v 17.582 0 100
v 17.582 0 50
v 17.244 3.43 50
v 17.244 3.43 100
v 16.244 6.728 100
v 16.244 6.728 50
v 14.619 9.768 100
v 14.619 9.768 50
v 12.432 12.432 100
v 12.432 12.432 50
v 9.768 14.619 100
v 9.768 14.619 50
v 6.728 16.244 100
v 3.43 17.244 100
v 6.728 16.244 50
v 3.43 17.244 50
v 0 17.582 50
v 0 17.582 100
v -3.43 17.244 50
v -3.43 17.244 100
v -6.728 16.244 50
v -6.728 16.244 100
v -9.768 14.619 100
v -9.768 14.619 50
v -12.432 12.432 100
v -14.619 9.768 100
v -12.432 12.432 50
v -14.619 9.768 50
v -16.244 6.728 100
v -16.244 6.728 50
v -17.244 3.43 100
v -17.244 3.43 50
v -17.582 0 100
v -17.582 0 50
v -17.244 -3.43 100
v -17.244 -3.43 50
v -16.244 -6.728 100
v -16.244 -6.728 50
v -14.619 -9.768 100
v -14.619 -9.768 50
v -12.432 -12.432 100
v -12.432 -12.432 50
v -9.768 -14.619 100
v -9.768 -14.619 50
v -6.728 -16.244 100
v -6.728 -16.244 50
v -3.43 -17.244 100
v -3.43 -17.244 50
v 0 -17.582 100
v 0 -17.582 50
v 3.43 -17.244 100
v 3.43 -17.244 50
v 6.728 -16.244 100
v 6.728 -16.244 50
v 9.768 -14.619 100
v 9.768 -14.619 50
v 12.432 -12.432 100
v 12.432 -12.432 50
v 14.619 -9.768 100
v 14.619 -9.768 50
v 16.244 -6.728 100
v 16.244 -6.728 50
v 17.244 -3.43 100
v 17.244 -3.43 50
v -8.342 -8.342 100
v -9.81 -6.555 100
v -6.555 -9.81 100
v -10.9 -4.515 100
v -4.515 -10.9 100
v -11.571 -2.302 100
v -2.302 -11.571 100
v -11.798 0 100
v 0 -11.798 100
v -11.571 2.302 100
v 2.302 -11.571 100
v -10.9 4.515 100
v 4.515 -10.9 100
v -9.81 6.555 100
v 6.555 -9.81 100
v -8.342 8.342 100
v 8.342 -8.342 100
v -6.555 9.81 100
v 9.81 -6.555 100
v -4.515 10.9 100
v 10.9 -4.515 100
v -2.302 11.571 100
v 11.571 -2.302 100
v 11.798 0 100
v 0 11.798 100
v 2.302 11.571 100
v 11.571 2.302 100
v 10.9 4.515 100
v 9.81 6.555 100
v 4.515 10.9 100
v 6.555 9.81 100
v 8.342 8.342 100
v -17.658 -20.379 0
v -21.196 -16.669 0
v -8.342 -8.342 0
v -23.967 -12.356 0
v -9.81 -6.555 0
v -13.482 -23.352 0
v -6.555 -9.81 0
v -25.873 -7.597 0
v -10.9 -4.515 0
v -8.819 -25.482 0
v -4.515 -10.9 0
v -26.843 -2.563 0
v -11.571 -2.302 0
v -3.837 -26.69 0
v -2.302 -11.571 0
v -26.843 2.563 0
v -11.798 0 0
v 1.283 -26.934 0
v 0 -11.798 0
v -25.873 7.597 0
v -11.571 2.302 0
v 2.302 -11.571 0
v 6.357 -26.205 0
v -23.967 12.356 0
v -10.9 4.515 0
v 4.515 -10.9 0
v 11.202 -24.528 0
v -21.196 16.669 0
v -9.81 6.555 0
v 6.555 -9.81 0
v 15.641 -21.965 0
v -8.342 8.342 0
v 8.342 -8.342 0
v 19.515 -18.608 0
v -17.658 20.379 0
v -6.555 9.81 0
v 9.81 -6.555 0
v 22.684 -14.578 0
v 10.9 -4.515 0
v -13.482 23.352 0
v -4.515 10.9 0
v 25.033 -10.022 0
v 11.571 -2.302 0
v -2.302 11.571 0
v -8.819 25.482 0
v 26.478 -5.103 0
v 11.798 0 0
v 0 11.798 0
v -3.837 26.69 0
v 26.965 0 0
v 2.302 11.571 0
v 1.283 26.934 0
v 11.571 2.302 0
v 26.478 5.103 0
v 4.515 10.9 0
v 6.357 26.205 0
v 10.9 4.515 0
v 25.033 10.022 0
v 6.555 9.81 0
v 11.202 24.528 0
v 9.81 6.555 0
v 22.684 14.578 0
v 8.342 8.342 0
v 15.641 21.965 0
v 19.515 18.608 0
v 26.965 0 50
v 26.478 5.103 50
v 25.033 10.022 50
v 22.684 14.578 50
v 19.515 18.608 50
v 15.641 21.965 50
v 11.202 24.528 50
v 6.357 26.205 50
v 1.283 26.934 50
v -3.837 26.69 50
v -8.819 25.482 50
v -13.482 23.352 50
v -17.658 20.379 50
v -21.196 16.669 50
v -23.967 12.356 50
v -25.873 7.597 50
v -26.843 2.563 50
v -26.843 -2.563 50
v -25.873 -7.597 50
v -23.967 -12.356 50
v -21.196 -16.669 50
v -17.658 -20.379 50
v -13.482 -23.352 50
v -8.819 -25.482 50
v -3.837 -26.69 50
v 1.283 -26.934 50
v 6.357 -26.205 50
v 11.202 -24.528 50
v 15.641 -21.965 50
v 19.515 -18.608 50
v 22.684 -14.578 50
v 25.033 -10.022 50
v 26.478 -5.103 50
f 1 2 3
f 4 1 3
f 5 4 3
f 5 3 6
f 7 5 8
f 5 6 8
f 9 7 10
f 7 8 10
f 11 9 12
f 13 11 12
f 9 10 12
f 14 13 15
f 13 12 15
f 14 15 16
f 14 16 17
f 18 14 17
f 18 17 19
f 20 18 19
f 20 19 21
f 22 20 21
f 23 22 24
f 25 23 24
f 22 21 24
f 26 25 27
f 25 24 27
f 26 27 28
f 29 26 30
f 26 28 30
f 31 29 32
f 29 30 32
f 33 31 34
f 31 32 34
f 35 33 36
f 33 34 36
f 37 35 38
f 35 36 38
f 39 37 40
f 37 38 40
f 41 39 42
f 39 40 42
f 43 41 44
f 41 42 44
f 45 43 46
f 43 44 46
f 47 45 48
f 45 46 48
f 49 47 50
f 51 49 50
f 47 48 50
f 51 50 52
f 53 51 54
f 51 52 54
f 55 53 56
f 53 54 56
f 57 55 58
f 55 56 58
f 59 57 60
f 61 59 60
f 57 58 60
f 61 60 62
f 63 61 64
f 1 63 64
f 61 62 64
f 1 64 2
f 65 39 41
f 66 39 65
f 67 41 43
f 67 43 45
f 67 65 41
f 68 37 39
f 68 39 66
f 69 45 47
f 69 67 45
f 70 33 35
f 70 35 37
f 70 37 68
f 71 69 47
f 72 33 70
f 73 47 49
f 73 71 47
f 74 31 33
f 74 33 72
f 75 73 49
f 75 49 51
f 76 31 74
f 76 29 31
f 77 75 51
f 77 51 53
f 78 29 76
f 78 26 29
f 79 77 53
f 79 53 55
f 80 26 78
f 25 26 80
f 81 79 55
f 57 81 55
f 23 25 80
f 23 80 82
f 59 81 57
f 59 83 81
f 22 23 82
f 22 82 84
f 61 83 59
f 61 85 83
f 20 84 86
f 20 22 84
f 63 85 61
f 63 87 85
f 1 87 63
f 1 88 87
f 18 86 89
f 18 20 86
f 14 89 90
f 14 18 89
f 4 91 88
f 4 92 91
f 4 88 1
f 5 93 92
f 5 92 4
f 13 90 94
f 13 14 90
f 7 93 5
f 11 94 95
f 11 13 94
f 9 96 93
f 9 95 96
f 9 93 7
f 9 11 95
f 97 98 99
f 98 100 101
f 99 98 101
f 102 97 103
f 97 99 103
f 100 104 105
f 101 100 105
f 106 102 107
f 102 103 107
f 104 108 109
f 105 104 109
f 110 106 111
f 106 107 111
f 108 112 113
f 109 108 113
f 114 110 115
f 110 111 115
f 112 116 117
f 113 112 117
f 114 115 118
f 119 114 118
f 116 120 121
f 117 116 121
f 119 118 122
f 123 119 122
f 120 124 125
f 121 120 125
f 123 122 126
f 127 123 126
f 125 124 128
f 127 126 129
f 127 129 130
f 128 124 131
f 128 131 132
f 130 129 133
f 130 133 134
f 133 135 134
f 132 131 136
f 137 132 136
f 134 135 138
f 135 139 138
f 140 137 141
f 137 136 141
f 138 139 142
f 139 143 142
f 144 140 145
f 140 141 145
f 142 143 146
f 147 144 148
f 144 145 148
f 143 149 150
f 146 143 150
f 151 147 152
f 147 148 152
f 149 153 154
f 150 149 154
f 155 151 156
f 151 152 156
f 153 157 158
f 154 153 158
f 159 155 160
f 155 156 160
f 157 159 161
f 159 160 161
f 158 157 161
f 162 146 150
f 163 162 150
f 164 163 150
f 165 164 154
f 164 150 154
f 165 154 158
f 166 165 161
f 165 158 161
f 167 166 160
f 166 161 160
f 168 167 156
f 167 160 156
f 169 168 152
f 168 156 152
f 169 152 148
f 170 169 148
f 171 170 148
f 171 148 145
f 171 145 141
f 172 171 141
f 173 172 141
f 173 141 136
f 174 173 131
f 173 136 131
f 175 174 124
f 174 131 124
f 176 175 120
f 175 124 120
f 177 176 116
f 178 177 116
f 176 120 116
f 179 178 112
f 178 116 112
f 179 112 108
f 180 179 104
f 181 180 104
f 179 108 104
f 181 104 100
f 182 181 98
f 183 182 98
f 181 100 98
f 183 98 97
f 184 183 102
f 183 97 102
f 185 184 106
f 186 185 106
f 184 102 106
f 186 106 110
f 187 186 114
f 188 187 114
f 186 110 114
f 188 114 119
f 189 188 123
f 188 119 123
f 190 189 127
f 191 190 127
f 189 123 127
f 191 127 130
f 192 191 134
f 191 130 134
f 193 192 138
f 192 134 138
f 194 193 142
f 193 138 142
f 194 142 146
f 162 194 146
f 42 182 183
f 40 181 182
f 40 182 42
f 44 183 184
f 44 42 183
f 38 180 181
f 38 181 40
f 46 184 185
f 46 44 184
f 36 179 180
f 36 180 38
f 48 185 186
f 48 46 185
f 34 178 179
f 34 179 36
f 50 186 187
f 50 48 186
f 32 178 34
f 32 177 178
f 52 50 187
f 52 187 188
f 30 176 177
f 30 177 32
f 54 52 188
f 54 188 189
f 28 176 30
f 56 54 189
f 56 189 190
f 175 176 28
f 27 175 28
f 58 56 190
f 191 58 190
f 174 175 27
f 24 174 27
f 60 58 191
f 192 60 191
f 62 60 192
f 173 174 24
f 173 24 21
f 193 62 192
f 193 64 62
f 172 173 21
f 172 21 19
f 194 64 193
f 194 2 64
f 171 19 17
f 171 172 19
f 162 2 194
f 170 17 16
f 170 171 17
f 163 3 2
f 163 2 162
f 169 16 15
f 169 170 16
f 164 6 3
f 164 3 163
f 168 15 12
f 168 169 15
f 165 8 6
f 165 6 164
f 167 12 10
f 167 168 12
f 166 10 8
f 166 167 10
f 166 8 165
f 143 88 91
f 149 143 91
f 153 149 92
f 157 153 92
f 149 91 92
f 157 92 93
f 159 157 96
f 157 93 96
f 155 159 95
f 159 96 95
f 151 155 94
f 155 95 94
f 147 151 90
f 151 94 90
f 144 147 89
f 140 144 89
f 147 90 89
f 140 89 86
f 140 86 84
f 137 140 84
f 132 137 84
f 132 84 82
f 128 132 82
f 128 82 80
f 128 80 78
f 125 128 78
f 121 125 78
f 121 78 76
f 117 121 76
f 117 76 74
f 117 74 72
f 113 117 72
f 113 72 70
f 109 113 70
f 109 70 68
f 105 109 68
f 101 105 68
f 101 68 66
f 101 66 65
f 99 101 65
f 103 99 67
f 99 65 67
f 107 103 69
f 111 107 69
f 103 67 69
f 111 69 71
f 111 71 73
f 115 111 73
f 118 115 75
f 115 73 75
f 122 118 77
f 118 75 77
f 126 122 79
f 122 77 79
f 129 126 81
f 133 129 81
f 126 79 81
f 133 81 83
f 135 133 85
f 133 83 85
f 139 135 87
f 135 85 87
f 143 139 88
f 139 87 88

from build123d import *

# Parameters (mm, degrees)
F0_R     = 26.964837
F1_DEPTH = 50
F2_R     = 17.581895
F3_DEPTH = 50
F4_R     = 11.797874
F5_DEPTH = 100.001


with BuildPart() as f1:
    # F0 (on Top) → F1 (new body)
    with BuildSketch(Plane.XY):
        Circle(F0_R)
    extrude(amount=F1_DEPTH)

    # F2 (on face) → F3 (join)
    with BuildSketch(Plane.XY.offset(50)):
        Circle(F2_R)
    extrude(amount=F3_DEPTH)

    # F4 (on face) → F5 (cut, through all)
    with BuildSketch(Plane.XY.offset(100)):
        Circle(F4_R)
    extrude(amount=-F5_DEPTH, mode=Mode.SUBTRACT)


solid = f1.part
